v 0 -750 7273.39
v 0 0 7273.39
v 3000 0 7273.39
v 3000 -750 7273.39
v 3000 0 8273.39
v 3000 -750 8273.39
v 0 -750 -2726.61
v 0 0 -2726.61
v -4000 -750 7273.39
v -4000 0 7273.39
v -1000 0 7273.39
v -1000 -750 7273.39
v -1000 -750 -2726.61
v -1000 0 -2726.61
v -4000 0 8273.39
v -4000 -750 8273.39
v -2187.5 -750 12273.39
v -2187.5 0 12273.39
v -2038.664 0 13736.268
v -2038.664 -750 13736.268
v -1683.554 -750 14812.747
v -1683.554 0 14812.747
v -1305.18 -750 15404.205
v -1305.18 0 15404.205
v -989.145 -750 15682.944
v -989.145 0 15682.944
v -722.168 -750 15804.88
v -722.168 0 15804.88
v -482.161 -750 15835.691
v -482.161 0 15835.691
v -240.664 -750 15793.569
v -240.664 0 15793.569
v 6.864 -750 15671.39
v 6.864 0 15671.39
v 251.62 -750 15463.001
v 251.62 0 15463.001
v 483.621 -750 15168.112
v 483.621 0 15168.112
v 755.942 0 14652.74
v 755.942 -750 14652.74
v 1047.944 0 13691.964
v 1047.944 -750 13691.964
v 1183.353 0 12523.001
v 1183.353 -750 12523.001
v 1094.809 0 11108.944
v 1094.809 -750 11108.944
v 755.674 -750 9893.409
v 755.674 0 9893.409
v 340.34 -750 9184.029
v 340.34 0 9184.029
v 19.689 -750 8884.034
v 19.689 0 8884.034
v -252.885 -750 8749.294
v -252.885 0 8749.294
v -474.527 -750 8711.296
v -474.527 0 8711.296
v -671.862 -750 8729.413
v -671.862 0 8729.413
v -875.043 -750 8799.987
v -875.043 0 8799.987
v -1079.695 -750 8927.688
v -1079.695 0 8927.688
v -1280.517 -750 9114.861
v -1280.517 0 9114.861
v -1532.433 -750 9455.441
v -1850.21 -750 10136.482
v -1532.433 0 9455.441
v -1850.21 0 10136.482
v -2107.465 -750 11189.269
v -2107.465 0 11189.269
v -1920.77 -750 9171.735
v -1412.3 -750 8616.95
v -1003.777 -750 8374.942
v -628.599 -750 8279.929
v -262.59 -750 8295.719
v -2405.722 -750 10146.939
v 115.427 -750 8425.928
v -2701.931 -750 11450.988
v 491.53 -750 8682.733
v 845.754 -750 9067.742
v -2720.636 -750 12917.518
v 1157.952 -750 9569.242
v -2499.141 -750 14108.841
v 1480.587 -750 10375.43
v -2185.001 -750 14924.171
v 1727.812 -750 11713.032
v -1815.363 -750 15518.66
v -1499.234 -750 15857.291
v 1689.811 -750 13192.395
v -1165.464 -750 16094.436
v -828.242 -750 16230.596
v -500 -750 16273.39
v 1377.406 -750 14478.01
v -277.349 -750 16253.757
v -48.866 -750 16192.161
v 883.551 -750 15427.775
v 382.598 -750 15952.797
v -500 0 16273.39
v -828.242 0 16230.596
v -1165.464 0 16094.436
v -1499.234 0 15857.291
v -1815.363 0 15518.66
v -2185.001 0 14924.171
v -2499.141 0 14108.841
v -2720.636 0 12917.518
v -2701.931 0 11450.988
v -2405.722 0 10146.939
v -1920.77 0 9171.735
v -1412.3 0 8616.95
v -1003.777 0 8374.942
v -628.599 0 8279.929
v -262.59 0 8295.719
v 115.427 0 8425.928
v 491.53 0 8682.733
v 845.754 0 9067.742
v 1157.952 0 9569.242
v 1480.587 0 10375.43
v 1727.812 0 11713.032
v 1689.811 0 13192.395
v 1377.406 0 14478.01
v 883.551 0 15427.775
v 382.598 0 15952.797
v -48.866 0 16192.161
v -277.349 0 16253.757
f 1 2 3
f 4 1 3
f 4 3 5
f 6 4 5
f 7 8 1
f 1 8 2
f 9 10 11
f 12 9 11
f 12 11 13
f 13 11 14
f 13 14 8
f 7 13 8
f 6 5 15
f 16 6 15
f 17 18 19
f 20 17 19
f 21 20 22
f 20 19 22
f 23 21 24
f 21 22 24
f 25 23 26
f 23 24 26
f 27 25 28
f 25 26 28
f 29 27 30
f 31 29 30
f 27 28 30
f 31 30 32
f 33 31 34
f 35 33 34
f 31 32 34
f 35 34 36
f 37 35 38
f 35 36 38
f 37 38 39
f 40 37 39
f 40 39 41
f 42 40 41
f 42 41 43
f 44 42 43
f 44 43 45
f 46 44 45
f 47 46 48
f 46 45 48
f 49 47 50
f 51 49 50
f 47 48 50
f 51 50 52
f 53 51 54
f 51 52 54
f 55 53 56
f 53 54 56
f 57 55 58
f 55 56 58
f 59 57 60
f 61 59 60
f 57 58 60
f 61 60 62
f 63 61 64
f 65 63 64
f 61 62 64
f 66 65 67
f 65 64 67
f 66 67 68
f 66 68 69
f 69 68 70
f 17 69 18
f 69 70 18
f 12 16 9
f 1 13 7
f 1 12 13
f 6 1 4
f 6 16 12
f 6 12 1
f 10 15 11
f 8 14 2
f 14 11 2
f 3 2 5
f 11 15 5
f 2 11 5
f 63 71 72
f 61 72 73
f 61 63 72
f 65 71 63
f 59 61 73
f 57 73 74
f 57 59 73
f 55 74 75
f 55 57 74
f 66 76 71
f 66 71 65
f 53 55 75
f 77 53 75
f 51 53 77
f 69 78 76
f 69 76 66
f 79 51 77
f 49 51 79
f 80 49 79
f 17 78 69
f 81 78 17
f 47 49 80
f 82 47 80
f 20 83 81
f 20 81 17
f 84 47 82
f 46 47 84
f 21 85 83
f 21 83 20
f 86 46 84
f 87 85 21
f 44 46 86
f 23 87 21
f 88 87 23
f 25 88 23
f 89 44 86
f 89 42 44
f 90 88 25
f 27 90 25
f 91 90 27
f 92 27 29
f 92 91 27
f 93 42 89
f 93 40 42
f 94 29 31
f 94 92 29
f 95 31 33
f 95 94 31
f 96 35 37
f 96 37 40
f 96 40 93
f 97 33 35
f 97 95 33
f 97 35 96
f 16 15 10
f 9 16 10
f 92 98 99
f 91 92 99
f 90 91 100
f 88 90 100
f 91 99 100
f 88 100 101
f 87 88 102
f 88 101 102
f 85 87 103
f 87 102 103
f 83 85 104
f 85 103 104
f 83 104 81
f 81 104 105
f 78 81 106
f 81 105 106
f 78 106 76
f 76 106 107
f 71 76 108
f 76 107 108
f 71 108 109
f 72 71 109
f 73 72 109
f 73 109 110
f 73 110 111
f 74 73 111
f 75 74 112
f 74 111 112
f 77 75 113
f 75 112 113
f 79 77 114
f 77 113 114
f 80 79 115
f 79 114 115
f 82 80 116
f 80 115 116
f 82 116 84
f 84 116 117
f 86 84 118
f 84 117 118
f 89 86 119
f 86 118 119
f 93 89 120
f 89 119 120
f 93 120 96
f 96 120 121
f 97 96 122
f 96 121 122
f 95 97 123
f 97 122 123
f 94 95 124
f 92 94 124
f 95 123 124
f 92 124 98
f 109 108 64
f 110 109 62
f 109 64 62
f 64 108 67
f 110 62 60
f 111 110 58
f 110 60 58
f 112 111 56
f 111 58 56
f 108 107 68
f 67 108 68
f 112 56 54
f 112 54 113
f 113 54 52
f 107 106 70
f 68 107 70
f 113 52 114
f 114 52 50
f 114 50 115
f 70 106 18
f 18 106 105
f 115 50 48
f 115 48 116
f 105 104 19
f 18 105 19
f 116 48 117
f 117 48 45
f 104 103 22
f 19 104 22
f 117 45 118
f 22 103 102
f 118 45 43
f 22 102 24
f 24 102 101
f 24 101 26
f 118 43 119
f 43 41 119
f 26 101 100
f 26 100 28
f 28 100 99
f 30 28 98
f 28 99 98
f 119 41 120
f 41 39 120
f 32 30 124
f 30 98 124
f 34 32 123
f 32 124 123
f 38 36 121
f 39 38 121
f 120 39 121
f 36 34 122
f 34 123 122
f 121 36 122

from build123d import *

# Parameters (mm, degrees)
F1_DEPTH = 750


with BuildPart() as f1:
    # F0 (on Front) → F1 (new body)
    with BuildSketch(Plane.XZ):
        with BuildLine():
            add(Edge.make_bspline(
                [(-2750, 12273.3898056417), (-2750, 8273.3898056417), (-500, 8273.3898056417)],
                knots=[1.5707963268, 1.5707963268, 1.5707963268, 3.1415926536, 3.1415926536, 3.1415926536], degree=2, weights=[1, 0.7071067812, 1]))
            Line((-500, 8273.3898056417), (-500, 8710.8898056417))
            add(Edge.make_bspline(
                [(-2187.5, 12273.3898056417), (-2187.5, 8710.8898056417), (-500, 8710.8898056417)],
                knots=[4.7123889804, 4.7123889804, 4.7123889804, 6.2831853072, 6.2831853072, 6.2831853072], degree=2, weights=[1, 0.7071067812, 1]))
            Line((-2187.5, 12273.3898056417), (-2750, 12273.3898056417))
        make_face()
        with BuildLine():
            Line((-500, 8710.8898056417), (-500, 8273.3898056417))
            add(Edge.make_bspline(
                [(-500, 8273.3898056417), (1750, 8273.3898056417), (1750, 12273.3898056417), (1750, 16273.3898056417), (-500, 16273.3898056417)],
                knots=[3.1415926536, 3.1415926536, 3.1415926536, 4.7123889804, 4.7123889804, 6.2831853072, 6.2831853072, 6.2831853072], degree=2, weights=[1, 0.7071067812, 1, 0.7071067812, 1]))
            Line((-500, 16273.3898056417), (-500, 15835.8898056417))
            add(Edge.make_bspline(
                [(-500, 8710.8898056417), (1187.5, 8710.8898056417), (1187.5, 12273.3898056416), (1187.5, 15835.8898056416), (-500, 15835.8898056417)],
                knots=[0, 0, 0, 1.5707963268, 1.5707963268, 3.1415926536, 3.1415926536, 3.1415926536], degree=2, weights=[1, 0.7071067812, 1, 0.7071067812, 1]))
        make_face()
        with BuildLine():
            add(Edge.make_bspline(
                [(-500, 16273.3898056417), (-2750, 16273.3898056417), (-2750, 12273.3898056417)],
                knots=[0, 0, 0, 1.5707963268, 1.5707963268, 1.5707963268], degree=2, weights=[1, 0.7071067812, 1]))
            Line((-2750, 12273.3898056417), (-2187.5, 12273.3898056417))
            add(Edge.make_bspline(
                [(-500, 15835.8898056417), (-2187.5, 15835.8898056417), (-2187.5, 12273.3898056417)],
                knots=[3.1415926536, 3.1415926536, 3.1415926536, 4.7123889804, 4.7123889804, 4.7123889804], degree=2, weights=[1, 0.7071067812, 1]))
            Line((-500, 15835.8898056417), (-500, 16273.3898056417))
        make_face()
    extrude(amount=F1_DEPTH)


with BuildPart() as f1b:
    # F0 (on Front) → F1, piece 2 (new body)
    with BuildSketch(Plane.XZ):
        Polygon((-1000, -2726.6101943583), (0, -2726.6101943583), (0, 7273.3898056417), (3000, 7273.3898056417), (3000, 8273.3898056417), (-500, 8273.3898056417), (-4000, 8273.3898056417), (-4000, 7273.3898056417), (-1000, 7273.3898056417), align=None)
    extrude(amount=F1_DEPTH)


solid = Compound([f1.part, f1b.part])
